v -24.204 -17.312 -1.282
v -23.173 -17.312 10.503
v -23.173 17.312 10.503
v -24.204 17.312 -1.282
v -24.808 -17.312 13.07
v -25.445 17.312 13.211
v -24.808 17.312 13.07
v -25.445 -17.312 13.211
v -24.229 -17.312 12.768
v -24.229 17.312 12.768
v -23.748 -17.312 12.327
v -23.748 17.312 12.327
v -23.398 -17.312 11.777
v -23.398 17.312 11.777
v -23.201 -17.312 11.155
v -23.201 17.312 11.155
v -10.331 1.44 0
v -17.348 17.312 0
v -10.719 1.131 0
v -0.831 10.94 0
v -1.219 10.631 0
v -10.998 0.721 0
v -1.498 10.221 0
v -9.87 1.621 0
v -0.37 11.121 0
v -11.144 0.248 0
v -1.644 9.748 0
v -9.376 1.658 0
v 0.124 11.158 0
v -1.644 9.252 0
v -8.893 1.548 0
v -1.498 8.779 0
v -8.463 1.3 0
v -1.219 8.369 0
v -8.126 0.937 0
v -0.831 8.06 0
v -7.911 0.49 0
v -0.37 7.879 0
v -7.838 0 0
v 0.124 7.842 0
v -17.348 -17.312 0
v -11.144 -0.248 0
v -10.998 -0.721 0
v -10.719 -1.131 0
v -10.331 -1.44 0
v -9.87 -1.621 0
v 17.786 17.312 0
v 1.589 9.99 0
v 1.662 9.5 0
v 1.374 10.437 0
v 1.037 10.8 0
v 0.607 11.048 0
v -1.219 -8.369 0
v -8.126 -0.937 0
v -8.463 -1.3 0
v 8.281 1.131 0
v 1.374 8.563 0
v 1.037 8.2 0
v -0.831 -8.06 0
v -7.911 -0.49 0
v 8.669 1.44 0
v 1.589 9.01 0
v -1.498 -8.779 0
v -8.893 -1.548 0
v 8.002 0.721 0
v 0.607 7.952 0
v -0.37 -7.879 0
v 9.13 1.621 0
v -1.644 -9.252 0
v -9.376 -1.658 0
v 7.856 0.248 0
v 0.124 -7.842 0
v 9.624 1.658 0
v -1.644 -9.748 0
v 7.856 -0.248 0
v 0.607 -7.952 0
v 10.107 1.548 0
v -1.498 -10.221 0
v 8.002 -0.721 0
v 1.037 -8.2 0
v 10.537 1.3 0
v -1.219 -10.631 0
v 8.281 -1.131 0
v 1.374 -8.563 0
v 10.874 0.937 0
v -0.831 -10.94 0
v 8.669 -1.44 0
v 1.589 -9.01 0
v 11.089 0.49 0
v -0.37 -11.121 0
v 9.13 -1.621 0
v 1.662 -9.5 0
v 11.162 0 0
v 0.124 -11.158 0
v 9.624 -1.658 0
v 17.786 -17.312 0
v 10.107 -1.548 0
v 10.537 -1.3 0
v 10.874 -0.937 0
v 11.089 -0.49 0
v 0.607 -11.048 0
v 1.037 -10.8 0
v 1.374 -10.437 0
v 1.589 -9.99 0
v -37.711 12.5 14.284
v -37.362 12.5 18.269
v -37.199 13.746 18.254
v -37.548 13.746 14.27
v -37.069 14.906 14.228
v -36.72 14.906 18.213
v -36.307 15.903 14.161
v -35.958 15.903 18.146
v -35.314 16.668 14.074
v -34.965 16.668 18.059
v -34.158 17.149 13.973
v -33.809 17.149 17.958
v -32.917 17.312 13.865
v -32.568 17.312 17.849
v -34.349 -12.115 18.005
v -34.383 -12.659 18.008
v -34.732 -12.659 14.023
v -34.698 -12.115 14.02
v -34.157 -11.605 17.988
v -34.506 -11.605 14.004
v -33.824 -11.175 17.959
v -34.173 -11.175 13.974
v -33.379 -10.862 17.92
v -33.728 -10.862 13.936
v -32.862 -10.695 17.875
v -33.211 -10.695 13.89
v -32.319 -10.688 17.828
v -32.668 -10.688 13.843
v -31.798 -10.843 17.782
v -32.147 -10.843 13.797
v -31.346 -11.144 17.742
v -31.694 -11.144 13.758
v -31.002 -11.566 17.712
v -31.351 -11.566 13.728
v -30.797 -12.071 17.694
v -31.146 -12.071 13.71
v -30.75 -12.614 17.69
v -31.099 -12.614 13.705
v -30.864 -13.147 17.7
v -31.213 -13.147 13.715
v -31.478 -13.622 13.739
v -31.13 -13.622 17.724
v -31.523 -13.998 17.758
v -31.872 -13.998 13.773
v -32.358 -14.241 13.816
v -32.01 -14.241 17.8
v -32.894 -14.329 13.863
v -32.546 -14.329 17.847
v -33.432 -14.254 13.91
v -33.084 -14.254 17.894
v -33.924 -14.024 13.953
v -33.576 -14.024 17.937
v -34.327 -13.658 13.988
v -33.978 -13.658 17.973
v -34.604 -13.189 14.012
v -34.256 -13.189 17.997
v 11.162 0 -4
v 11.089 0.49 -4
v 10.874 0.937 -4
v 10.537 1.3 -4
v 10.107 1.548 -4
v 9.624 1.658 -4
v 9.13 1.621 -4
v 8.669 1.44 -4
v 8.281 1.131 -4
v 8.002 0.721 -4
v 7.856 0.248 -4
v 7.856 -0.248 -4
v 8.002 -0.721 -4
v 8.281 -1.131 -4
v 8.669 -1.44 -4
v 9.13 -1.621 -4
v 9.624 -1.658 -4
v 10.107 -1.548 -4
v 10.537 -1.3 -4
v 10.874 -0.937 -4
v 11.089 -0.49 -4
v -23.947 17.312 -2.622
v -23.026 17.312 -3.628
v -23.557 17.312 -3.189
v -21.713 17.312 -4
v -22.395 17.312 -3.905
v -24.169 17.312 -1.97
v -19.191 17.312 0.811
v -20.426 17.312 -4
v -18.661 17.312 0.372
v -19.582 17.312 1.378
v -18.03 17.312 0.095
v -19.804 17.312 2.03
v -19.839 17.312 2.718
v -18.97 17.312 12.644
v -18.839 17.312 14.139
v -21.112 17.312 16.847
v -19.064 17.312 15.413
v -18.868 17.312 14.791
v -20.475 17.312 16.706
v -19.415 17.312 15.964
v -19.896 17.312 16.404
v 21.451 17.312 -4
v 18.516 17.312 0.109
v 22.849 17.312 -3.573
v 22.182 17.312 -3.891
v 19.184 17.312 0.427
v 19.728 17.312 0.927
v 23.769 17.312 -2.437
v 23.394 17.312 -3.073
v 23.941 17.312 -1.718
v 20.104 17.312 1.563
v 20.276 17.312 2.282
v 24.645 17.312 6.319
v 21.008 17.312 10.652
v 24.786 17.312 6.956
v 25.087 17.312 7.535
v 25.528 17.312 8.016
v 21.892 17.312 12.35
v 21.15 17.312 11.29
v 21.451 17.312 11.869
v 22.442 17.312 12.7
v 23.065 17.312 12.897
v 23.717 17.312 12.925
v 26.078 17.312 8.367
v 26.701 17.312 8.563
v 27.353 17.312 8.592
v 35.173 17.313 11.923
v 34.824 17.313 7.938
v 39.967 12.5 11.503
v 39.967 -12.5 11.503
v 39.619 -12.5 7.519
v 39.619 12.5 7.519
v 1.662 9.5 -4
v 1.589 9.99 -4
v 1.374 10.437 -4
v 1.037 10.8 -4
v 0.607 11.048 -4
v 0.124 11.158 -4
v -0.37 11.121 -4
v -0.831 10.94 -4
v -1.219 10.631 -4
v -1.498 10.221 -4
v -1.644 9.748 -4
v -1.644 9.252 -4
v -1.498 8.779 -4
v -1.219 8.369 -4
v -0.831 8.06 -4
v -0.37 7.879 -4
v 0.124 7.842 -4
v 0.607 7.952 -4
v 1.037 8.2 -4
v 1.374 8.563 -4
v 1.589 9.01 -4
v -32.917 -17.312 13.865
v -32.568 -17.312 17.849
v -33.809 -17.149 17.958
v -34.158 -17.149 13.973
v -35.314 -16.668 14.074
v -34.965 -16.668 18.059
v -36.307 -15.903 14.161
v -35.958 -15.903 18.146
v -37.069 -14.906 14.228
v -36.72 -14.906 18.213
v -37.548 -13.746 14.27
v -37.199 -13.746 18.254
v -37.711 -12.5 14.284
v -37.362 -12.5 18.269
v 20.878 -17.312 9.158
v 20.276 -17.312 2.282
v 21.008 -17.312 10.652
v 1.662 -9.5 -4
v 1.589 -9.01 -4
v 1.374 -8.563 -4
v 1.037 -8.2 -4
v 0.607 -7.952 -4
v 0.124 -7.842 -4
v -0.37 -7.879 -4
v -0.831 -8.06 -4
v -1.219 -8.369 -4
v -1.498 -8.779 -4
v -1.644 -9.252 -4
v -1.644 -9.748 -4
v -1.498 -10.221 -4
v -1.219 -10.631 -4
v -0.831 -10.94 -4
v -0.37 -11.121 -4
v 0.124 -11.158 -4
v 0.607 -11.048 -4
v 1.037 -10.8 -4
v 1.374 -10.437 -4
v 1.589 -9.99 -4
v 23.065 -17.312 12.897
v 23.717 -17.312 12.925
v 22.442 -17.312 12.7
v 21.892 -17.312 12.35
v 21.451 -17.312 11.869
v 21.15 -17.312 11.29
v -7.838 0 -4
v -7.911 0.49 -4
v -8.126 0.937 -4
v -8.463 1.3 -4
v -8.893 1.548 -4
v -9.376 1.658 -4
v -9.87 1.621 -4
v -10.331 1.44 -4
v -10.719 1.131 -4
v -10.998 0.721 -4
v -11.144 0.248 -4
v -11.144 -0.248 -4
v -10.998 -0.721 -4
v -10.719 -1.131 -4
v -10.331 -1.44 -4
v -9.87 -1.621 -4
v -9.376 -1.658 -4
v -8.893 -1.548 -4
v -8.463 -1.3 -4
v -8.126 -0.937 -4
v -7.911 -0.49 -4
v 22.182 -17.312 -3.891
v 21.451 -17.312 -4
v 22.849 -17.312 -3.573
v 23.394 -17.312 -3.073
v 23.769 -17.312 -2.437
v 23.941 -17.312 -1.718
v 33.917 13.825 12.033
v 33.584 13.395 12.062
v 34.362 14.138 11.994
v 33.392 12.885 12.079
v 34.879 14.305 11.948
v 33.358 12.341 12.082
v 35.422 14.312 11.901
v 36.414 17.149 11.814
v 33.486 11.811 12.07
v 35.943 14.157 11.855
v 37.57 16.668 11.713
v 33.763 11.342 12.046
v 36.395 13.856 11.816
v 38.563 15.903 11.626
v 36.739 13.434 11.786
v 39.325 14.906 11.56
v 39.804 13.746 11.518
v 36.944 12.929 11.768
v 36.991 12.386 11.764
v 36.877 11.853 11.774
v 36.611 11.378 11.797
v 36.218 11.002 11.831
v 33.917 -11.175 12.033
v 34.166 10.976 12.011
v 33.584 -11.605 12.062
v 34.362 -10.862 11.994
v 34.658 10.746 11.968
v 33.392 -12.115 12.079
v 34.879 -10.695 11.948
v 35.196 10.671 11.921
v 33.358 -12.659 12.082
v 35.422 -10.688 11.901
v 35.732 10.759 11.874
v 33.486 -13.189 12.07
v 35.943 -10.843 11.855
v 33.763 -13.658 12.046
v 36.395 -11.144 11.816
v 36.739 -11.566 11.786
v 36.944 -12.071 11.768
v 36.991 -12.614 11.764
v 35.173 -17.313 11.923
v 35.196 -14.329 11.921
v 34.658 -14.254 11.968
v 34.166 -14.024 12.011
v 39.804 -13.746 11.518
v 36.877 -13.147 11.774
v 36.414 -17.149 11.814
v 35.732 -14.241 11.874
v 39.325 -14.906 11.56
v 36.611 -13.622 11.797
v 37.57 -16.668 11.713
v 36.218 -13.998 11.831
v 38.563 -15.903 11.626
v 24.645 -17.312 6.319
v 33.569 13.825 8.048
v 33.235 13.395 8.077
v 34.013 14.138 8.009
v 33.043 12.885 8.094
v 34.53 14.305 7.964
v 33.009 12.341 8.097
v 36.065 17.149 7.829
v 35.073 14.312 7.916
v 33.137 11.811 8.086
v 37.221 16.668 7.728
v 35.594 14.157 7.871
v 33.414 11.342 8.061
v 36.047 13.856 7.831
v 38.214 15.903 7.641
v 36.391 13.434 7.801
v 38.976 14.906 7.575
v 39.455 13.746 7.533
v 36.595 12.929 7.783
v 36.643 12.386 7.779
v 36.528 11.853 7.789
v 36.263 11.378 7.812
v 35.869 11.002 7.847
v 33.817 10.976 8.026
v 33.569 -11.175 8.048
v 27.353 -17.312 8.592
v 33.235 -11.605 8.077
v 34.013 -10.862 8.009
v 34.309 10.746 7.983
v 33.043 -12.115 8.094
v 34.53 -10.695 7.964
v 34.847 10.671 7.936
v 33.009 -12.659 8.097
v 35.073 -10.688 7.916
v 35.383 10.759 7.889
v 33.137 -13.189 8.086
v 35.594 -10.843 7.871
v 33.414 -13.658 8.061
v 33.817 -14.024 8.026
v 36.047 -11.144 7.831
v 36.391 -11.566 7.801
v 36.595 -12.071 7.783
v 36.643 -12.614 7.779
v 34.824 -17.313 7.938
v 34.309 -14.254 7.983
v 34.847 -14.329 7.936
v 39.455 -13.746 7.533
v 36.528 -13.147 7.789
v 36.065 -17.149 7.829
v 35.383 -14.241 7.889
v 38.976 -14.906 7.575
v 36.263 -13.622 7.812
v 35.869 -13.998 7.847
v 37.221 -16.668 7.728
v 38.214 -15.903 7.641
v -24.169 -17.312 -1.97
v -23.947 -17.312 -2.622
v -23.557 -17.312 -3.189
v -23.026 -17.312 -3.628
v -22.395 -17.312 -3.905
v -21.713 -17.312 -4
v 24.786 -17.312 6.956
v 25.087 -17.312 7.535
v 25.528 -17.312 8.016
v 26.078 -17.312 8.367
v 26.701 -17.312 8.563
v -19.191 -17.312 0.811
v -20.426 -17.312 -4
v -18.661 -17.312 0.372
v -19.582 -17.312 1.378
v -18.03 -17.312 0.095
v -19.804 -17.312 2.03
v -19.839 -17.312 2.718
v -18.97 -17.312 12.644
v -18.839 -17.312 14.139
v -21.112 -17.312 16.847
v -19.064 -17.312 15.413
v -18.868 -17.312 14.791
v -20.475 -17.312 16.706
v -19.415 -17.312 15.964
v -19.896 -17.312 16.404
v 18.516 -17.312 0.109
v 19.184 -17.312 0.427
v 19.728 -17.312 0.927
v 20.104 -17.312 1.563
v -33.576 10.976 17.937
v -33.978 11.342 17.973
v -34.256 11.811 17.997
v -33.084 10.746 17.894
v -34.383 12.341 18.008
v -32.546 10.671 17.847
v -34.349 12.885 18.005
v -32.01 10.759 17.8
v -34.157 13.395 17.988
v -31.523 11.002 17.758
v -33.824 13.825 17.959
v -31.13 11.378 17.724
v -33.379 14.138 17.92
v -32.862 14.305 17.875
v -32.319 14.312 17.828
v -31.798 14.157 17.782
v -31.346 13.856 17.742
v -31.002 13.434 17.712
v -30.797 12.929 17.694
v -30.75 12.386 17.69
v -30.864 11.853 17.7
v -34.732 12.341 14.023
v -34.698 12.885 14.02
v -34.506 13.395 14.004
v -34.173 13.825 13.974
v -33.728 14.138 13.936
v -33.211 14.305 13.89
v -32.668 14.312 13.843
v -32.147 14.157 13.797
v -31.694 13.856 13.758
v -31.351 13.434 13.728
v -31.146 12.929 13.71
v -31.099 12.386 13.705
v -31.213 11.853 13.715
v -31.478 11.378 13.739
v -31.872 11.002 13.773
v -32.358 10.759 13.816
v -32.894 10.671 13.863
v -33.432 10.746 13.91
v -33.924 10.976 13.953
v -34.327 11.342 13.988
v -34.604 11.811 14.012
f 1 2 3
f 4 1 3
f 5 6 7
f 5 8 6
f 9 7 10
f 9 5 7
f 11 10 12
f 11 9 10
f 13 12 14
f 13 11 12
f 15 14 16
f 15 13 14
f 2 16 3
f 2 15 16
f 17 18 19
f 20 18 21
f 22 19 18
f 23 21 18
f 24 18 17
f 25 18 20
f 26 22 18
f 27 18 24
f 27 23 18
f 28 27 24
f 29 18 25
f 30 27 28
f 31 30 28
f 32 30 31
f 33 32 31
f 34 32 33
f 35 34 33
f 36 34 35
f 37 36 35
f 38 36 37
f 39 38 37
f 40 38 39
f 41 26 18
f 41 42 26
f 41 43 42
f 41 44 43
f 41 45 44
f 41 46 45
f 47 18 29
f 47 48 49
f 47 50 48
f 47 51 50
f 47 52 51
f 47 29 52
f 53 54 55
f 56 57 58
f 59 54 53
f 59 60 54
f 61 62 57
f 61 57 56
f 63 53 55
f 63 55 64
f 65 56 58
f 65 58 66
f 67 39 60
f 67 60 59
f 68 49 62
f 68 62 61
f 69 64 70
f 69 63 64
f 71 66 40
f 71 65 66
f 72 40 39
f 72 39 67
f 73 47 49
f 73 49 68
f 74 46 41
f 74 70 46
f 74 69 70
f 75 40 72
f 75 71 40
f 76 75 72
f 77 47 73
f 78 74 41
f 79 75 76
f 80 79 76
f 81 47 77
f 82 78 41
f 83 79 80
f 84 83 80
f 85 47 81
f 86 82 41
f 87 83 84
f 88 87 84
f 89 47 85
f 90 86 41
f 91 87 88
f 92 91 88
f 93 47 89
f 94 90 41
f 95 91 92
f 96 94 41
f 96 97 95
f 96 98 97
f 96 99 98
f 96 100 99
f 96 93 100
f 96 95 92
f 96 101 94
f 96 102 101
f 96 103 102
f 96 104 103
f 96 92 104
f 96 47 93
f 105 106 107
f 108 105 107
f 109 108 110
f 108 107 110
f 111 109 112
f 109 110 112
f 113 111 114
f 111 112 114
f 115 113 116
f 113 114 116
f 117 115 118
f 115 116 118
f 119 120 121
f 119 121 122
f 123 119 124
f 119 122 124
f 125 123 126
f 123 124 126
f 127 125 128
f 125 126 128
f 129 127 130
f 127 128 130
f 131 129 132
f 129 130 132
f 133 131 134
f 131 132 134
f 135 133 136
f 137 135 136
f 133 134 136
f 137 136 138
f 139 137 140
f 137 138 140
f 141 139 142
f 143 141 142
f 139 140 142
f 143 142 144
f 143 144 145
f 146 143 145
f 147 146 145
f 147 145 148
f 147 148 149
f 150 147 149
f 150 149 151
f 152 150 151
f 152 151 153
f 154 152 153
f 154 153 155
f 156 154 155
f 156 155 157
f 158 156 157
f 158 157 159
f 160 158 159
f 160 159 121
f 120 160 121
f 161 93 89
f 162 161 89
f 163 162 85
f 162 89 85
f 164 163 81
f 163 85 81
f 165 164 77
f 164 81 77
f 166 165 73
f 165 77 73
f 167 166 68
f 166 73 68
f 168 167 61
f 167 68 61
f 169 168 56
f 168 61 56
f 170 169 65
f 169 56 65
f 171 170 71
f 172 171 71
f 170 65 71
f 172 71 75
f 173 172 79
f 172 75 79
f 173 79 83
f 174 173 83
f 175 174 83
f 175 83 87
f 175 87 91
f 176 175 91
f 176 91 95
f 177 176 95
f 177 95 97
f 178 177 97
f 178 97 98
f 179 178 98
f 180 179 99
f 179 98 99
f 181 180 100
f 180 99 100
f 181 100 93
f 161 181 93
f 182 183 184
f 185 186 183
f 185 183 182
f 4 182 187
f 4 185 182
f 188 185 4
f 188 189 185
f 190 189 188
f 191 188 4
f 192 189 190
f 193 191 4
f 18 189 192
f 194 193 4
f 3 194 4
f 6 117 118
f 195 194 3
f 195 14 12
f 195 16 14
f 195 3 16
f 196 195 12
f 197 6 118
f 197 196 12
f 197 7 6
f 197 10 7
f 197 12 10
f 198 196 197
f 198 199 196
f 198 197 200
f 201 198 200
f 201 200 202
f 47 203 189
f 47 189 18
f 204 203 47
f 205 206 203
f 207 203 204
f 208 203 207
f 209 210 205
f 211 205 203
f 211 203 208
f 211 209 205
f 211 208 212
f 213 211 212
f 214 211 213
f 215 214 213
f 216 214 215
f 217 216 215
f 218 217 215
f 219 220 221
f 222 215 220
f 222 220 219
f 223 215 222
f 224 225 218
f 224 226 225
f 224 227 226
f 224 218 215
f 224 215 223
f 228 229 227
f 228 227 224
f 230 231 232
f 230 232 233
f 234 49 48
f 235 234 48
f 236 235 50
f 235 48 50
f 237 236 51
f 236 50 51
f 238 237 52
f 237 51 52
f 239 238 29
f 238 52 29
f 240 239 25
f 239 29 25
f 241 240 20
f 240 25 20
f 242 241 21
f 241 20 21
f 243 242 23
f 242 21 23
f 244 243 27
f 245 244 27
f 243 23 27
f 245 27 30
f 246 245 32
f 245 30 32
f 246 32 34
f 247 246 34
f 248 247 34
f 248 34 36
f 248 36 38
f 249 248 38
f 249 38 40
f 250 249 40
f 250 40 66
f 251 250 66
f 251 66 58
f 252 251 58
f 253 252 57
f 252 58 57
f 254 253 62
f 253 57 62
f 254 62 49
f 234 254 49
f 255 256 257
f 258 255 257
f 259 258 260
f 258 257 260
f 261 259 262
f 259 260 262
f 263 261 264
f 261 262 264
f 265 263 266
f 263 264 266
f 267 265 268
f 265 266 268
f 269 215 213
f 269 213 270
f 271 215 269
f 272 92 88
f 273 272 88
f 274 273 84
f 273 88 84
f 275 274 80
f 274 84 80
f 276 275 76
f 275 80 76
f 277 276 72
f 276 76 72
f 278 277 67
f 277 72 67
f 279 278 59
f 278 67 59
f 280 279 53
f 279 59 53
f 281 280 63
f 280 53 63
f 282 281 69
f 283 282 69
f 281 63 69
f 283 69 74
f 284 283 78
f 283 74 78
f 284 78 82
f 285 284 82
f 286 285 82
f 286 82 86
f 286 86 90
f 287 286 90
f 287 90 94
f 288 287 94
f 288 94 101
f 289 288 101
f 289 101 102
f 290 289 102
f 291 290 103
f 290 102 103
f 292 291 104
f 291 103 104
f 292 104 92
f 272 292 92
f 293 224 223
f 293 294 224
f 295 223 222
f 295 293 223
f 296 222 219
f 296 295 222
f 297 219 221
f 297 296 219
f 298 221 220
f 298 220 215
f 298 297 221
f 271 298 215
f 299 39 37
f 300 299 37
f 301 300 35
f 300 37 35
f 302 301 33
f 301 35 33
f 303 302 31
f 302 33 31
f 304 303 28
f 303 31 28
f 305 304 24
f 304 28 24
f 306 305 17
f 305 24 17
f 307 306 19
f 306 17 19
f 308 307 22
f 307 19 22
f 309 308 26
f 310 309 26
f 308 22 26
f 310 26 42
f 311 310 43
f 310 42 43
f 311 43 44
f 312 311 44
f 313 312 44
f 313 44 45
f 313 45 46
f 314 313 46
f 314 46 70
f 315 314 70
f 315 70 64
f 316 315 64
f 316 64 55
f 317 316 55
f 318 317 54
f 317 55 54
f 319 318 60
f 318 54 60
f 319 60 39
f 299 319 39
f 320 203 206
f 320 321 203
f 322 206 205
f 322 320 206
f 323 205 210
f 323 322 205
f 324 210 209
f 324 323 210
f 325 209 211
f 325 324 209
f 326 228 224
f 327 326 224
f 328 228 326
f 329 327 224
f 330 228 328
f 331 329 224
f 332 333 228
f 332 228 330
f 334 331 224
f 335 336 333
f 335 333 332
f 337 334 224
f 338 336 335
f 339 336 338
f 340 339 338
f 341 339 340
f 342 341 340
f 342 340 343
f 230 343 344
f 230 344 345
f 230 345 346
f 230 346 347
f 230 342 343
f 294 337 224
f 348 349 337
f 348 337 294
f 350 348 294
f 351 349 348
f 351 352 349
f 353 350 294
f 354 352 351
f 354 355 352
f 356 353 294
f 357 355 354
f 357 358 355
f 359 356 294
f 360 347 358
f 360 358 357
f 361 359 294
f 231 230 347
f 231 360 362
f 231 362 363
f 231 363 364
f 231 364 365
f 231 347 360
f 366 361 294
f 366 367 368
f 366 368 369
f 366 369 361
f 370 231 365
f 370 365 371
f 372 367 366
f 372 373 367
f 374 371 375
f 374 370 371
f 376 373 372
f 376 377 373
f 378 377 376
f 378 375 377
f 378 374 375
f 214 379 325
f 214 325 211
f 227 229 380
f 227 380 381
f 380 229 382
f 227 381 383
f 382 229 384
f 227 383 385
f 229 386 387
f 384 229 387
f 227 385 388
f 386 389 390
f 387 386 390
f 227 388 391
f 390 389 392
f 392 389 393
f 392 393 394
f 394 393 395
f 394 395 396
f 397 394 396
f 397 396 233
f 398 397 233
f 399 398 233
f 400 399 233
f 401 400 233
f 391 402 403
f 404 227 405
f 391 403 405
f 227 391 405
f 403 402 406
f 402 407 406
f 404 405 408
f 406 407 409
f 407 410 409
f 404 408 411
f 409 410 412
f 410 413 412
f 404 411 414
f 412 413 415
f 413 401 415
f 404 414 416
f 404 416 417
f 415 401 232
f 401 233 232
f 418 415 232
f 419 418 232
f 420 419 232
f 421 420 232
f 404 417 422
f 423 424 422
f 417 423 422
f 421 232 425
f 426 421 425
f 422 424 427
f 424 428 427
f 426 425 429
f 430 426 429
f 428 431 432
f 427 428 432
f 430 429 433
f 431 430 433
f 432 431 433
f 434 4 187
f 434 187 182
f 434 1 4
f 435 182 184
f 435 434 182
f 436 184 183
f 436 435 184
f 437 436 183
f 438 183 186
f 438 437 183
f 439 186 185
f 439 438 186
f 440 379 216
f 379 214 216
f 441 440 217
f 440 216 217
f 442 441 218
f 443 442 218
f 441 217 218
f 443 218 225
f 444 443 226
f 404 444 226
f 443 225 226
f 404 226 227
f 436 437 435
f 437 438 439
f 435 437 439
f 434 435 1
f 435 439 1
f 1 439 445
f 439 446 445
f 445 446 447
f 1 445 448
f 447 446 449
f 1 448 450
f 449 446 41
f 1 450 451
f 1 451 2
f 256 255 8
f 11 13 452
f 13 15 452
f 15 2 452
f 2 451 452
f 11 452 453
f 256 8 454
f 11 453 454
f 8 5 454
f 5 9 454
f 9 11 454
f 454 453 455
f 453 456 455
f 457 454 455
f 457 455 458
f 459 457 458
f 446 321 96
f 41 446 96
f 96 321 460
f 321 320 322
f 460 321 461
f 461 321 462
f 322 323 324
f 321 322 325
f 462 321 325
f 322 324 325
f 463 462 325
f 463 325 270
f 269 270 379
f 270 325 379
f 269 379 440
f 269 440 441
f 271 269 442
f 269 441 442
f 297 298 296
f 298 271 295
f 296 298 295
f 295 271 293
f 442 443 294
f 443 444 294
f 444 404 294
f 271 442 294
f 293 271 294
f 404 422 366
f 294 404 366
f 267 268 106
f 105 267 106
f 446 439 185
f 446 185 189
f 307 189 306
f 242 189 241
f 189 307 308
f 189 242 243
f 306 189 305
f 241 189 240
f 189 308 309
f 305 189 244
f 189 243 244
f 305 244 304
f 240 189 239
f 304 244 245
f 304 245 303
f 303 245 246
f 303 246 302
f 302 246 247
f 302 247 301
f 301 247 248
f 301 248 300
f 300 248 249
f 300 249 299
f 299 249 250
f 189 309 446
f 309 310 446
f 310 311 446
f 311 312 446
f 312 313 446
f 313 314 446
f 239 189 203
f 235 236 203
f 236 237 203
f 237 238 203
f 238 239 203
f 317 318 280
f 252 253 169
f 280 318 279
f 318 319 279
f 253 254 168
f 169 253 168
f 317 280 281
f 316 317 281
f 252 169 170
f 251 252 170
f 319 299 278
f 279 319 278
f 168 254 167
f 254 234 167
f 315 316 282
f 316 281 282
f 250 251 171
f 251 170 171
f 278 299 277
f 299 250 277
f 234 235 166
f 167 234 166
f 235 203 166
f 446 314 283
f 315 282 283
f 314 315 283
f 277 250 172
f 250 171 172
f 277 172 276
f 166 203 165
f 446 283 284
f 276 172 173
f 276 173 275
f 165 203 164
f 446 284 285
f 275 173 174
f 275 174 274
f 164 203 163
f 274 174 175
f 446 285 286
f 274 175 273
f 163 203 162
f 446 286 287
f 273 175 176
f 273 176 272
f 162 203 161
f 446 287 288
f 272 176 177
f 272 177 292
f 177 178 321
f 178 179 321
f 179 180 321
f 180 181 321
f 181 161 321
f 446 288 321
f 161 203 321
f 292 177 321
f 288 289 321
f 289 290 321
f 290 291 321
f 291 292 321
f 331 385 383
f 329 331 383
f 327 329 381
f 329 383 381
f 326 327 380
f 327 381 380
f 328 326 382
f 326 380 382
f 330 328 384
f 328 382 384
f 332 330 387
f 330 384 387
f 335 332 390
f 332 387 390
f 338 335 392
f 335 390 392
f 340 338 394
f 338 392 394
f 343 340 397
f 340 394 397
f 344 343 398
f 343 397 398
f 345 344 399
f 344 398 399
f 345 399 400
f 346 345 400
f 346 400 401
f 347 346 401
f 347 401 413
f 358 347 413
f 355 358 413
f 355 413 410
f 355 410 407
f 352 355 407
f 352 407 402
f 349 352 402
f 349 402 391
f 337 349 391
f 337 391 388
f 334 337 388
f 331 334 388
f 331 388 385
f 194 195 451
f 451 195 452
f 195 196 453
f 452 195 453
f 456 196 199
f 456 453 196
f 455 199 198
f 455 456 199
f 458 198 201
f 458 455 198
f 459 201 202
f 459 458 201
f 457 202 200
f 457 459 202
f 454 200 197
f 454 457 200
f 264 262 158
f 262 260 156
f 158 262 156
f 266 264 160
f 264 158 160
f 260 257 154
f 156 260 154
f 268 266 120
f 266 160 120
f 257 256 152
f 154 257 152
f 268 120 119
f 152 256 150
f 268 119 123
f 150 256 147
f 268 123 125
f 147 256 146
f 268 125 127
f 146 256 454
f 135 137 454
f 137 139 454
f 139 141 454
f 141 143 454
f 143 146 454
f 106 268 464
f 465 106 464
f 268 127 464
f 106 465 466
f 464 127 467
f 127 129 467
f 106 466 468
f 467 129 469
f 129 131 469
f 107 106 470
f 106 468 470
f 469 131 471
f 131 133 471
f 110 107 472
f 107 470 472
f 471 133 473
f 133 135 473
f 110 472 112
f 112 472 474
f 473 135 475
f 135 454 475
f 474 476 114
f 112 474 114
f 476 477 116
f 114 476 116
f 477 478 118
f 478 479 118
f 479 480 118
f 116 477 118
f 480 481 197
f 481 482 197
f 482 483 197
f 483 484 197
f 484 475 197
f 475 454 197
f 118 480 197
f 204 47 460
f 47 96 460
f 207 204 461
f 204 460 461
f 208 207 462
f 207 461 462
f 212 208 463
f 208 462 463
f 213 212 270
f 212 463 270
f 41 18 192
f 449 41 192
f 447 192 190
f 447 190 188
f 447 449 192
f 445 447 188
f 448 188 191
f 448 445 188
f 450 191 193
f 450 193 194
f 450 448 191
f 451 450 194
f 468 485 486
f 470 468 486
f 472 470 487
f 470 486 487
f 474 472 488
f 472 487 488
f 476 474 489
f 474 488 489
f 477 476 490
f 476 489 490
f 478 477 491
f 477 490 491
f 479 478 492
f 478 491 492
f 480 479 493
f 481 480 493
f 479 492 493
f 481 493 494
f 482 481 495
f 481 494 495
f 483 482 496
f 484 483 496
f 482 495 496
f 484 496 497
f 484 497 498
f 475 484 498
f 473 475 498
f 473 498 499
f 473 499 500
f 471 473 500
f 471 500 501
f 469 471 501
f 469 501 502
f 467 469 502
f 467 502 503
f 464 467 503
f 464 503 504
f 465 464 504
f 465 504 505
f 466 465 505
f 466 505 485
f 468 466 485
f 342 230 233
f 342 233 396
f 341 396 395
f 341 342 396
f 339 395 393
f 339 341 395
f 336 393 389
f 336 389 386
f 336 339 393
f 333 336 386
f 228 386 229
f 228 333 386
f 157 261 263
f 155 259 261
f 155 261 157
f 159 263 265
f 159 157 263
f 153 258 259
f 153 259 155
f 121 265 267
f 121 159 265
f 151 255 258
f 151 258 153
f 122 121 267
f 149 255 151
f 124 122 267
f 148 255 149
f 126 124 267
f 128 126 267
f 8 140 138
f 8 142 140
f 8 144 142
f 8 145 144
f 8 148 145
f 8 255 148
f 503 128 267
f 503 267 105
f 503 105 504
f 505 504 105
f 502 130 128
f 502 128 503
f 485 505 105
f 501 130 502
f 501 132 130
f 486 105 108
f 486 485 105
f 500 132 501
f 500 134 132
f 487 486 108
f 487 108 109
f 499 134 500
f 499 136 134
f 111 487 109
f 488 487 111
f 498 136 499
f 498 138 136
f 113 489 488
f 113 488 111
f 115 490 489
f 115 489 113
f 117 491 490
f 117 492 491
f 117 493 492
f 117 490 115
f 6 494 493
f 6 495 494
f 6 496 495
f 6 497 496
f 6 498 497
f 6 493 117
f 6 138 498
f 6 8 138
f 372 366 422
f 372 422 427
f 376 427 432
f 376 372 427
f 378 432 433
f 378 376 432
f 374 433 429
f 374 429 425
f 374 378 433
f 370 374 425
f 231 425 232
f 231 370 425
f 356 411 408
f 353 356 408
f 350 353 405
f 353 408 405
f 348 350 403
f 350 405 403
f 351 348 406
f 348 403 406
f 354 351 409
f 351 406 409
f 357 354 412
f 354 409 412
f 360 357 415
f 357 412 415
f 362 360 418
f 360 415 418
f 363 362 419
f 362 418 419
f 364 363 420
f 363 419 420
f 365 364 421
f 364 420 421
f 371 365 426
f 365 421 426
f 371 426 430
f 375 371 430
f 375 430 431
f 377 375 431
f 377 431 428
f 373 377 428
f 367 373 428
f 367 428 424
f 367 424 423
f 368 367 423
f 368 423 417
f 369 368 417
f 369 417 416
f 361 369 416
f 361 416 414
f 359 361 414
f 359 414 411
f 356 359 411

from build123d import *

# Parameters (mm, degrees)
SKETCH1_W             = 34.625
SKETCH1_H             = 34.625
SKETCH1_R             = 1.6625
BOSS_EXTRUDE1_DEPTH   = 4
BOSS_EXTRUDE2_DEPTH   = 4
BOSS_EXTRUDE2_2_DEPTH = 4
BOSS_EXTRUDE3_REACH   = 48.674
SKETCH7_W             = 4
SKETCH7_H             = 34.625
BOSS_EXTRUDE4_START   = -3.113851
SKETCH8_W             = 34.625
SKETCH8_H             = 4
BOSS_EXTRUDE4_DEPTH   = 3.113851
BOSS_EXTRUDE5_START   = -2.763897
SKETCH9_W             = 34.625
SKETCH9_H             = 4
BOSS_EXTRUDE5_DEPTH   = 2.763897
F_6_CLEARANCE_HOLE1_D = 3.6576
FILLET1_R             = 2.5


with BuildPart() as part:
    # Sketch1 → Boss-Extrude1 (new body)
    with BuildSketch(Plane.XY):
        Rectangle(SKETCH1_W, SKETCH1_H)
        with Locations((0, 9.5)):
            Circle(SKETCH1_R, mode=Mode.SUBTRACT)
        with Locations((9.5, 0)):
            Circle(SKETCH1_R, mode=Mode.SUBTRACT)
        with Locations((-9.5, 0)):
            Circle(SKETCH1_R, mode=Mode.SUBTRACT)
        with Locations((0, -9.5)):
            Circle(SKETCH1_R, mode=Mode.SUBTRACT)
    extrude(amount=-BOSS_EXTRUDE1_DEPTH)



with BuildPart() as body_2:
    # Sketch6 → Boss-Extrude2 (new body)
    with BuildSketch(Plane(origin=(378.277411027, 0, -18.094985133), x_dir=(0, 1, 0), z_dir=(-0.08715574274765159, 0, -0.9961946980917462))):
        with BuildLine():
            Line((-12.5, -417.227533142), (12.5, -417.227533142))
            ThreePointArc((12.5, -417.227533142), (15.902951384, -415.817984526), (17.3125, -412.415033142))
            Line((17.3125, -412.415033142), (17.3125, -398.415033142))
            Line((17.3125, -398.415033142), (-17.3125, -398.415033142))
            Line((-17.3125, -398.415033142), (-17.3125, -412.415033142))
            ThreePointArc((-17.3125, -412.415033142), (-15.902951384, -415.817984526), (-12.5, -417.227533142))
        make_face()
    extrude(amount=BOSS_EXTRUDE2_DEPTH)



with BuildPart() as body_3:
    # Sketch6 → Boss-Extrude2 2 (new body)
    with BuildSketch(Plane(origin=(378.277411027, 0, -18.094985133), x_dir=(0, 1, 0), z_dir=(-0.08715574274765159, 0, -0.9961946980917462))):
        with BuildLine():
            ThreePointArc((12.5, -339.602533142), (15.902951384, -341.012081757), (17.3125, -344.415033142))
            Line((17.3125, -344.415033142), (17.3125, -358.415033142))
            Line((17.3125, -358.415033142), (-17.3125, -358.415033142))
            Line((-17.3125, -358.415033142), (-17.3125, -344.415033142))
            ThreePointArc((-17.3125, -344.415033142), (-15.902951384, -341.012081757), (-12.5, -339.602533142))
            Line((-12.5, -339.602533142), (12.5, -339.602533142))
        make_face()
    extrude(amount=BOSS_EXTRUDE2_2_DEPTH)


with BuildPart() as body_2_1:
    add(body_2.part)

    add(body_3.part)  # Boss-Extrude3 merges body 3
    # Boss-Extrude3: up to this plane
    boss_extrude3_end = Plane(origin=(0, 0, -4), z_dir=(0, 0, 1))
    # Sketch7 → Boss-Extrude3 (add, up to the surface)
    with BuildSketch(Plane(origin=(1.302361333, 0, 14.886058148), x_dir=(-0.9961946980917462, 0, 0.08715574274765159), z_dir=(-0.08715574274765159, 0, -0.9961946980917462)), mode=Mode.PRIVATE) as boss_extrude3_sk1:
        with Locations((22, 0)):
            Rectangle(SKETCH7_W, SKETCH7_H)
    boss_extrude3_tool1 = split(extrude(boss_extrude3_sk1.sketch, amount=BOSS_EXTRUDE3_REACH, mode=Mode.PRIVATE), bisect_by=boss_extrude3_end, keep=Keep.BOTH, mode=Mode.PRIVATE)
    add(boss_extrude3_tool1.solids().sort_by_distance((-20.613922, 0, 16.803484))[0])
    # Sketch7 → Boss-Extrude3 (add, up to the surface)
    with BuildSketch(Plane(origin=(1.302361333, 0, 14.886058148), x_dir=(-0.9961946980917462, 0, 0.08715574274765159), z_dir=(-0.08715574274765159, 0, -0.9961946980917462)), mode=Mode.PRIVATE) as boss_extrude3_sk2:
        with Locations((-22, 0)):
            Rectangle(SKETCH7_W, SKETCH7_H)
    boss_extrude3_tool2 = split(extrude(boss_extrude3_sk2.sketch, amount=BOSS_EXTRUDE3_REACH, mode=Mode.PRIVATE), bisect_by=boss_extrude3_end, keep=Keep.BOTH, mode=Mode.PRIVATE)
    add(boss_extrude3_tool2.solids().sort_by_distance((23.218645, 0, 12.968632))[0])


with BuildPart() as part_1:
    add(part.part)

    add(body_2_1.part)  # Boss-Extrude4 merges body 2
    # Sketch8 → Boss-Extrude4 (add)
    with BuildSketch(Plane(origin=(-17.3125, 0, 0), x_dir=(0, -1, 0), z_dir=(1, 0, 0)).offset(BOSS_EXTRUDE4_START)):
        with Locations((0, 2)):
            Rectangle(SKETCH8_W, SKETCH8_H)
    extrude(amount=BOSS_EXTRUDE4_DEPTH)

    # Sketch9 → Boss-Extrude5 (add)
    with BuildSketch(Plane(origin=(17.3125, 0, 0), x_dir=(0, -1, 0), z_dir=(-1, 0, 0)).offset(BOSS_EXTRUDE5_START)):
        with Locations((0, -2)):
            Rectangle(SKETCH9_W, SKETCH9_H)
    extrude(amount=BOSS_EXTRUDE5_DEPTH)

    # #6 Clearance Hole1 (through all)
    with Locations(Plane(origin=(1.302361333, 0, 14.886058148), x_dir=(0.9924038765061053, 0.08715574274765146, -0.08682408883345863), z_dir=(0.08715574274765155, 0, 0.9961946980917461))):
        with Locations((-34.960066519, -9.489138473), (-32.781172951, 15.41572898), (34.960066519, 9.489138473), (32.781172951, -15.41572898)):
            Hole(F_6_CLEARANCE_HOLE1_D / 2)

    # Fillet1
    fillet1_edges = [part_1.edges().sort_by_distance(p)[0] for p in [
        (24.862411116, 0, 8.809541529),
        (23.741721447, 0, -4),
        (20.076397, 0, 0),
        (-22.954934393, 0, 12.993017181),
        (-20.076396751, 0, 0),
        (-18.621532629, 0, 16.629173003),
        (-24.441630755, 0, -4),
        (21.226255294, 0, 13.142943293),
    ]]
    fillet(fillet1_edges, radius=FILLET1_R)


solid = part_1.part
